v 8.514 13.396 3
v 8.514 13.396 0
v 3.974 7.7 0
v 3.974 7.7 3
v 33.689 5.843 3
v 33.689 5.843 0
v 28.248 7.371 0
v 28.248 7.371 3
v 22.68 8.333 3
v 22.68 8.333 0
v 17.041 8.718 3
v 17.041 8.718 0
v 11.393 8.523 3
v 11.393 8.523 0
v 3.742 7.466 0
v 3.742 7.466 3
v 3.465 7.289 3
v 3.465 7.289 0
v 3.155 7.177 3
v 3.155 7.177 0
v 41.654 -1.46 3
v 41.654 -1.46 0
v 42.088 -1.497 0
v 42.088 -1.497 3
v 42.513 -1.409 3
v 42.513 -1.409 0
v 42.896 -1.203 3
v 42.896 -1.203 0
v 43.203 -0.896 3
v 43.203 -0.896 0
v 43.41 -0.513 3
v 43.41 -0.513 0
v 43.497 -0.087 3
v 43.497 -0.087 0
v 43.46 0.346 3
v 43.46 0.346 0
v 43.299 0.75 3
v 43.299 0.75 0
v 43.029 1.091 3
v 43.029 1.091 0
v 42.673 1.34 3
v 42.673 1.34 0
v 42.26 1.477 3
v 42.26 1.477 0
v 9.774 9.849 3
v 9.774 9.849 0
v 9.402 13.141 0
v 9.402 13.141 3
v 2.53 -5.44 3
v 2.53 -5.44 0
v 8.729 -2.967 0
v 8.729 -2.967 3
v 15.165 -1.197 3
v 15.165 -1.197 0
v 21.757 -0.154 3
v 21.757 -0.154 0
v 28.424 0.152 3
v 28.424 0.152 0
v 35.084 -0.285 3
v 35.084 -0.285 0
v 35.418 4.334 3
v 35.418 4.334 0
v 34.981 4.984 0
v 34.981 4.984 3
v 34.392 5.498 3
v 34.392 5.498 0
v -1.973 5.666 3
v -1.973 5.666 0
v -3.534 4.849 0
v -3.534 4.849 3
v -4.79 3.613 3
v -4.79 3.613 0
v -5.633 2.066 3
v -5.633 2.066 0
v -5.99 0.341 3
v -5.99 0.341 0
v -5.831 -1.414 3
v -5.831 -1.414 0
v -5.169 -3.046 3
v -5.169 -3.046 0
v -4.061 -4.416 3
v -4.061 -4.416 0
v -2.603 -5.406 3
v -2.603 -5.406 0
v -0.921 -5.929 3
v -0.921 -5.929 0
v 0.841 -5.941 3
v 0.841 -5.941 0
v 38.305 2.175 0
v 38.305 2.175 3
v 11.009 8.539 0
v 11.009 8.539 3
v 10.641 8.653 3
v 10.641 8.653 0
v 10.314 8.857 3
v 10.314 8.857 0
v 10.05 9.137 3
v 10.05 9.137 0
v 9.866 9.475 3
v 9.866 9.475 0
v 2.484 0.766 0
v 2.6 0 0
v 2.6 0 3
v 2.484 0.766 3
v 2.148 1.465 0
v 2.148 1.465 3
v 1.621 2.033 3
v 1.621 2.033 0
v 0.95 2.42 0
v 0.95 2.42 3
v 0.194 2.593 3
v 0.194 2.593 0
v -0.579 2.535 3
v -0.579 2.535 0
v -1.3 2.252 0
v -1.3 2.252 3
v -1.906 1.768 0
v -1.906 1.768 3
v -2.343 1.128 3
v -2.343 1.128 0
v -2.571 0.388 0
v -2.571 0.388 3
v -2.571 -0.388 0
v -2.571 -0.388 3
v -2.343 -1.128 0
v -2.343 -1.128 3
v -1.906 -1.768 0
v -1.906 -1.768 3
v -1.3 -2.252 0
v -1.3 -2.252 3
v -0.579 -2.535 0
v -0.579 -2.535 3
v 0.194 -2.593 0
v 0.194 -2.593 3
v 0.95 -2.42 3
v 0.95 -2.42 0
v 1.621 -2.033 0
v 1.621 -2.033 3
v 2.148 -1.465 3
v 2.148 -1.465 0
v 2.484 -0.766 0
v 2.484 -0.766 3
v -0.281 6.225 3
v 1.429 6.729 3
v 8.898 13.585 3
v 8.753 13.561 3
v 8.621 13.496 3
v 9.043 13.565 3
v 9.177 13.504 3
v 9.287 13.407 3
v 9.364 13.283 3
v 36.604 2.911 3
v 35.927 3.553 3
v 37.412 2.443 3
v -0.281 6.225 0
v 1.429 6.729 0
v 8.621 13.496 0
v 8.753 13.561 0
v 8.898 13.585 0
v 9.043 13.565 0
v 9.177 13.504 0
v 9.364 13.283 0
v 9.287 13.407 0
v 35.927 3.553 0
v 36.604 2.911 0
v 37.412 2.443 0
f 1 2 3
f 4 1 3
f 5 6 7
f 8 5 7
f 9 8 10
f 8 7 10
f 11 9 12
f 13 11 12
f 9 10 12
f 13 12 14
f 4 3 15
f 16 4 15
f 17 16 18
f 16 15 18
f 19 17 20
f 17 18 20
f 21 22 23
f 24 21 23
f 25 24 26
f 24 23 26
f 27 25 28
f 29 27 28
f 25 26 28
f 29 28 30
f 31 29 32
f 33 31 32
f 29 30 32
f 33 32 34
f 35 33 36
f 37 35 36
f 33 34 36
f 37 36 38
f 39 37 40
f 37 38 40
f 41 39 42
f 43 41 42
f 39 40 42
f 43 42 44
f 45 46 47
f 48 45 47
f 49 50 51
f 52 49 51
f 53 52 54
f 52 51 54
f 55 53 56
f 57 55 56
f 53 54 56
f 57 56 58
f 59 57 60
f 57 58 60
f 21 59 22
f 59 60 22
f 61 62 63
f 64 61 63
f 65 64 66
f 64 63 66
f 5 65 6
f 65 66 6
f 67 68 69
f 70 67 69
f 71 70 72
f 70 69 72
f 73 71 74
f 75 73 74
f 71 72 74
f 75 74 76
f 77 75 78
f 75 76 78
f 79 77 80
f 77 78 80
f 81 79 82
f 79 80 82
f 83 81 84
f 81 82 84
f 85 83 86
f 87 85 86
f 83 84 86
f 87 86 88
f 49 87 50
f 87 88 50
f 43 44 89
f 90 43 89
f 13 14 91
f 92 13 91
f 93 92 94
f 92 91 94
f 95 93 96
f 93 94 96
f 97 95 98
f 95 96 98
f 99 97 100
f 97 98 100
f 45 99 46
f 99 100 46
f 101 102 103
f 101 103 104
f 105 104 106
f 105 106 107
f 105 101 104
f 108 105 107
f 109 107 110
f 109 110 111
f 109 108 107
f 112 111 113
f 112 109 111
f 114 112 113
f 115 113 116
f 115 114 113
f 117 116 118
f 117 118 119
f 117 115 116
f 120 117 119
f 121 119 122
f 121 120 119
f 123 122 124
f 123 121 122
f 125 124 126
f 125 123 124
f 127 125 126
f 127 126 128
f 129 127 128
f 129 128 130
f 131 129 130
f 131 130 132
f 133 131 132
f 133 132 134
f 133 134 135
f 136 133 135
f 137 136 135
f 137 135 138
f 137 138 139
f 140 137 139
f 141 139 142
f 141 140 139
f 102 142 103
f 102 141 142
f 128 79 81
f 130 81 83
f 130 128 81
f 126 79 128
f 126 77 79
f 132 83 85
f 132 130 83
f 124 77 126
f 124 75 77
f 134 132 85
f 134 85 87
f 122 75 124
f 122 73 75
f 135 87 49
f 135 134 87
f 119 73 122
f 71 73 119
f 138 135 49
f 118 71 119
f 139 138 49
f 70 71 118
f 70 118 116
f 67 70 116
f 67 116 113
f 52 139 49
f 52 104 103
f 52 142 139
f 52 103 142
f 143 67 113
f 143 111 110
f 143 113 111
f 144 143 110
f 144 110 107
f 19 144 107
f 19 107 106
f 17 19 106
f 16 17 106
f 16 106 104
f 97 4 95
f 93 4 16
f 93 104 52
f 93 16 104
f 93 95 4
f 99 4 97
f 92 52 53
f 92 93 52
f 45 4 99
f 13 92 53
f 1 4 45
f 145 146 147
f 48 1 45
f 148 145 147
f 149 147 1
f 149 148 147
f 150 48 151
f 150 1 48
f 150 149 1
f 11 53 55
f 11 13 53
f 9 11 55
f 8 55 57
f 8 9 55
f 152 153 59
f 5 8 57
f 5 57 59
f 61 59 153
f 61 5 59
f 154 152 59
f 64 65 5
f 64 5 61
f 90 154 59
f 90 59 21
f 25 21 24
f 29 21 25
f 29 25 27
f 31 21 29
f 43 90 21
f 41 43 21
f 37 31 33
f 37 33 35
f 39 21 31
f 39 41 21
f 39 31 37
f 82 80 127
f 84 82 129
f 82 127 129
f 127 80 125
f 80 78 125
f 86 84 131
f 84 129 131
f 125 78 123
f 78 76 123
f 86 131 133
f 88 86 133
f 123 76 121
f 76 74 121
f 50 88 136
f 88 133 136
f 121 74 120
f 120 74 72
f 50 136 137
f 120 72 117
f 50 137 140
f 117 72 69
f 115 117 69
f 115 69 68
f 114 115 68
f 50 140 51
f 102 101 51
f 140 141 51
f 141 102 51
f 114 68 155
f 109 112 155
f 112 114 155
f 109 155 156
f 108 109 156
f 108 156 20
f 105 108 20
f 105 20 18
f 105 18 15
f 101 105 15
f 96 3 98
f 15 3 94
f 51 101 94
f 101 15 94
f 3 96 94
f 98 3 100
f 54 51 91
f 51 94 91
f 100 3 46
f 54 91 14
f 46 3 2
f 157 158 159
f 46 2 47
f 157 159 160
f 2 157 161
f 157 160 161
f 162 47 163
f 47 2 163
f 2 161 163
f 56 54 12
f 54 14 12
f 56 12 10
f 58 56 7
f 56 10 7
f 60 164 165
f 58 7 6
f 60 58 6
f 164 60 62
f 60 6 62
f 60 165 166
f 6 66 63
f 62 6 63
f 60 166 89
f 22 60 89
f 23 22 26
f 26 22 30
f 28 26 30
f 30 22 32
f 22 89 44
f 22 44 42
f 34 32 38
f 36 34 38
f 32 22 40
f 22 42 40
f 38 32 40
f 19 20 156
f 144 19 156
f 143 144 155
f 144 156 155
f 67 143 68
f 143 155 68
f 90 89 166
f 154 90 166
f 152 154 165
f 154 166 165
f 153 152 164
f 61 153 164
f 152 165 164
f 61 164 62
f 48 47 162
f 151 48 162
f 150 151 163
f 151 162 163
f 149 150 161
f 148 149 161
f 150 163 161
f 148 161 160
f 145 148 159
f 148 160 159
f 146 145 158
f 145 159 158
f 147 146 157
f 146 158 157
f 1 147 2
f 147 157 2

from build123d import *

# Parameters (mm, degrees)
ESQUISSE1_R          = 2.6
BASE_EXTRUSION_DEPTH = 3


with BuildPart() as part:
    # Esquisse1 → Base-Extrusion (new body)
    with BuildSketch(Plane.XY):
        with BuildLine():
            Line((42.260472267, 1.47721163), (38.305407289, 2.174596295))
            ThreePointArc((38.305407289, 2.174596295), (36.604258385, 2.910637942), (35.417544816, 4.334497417))
            ThreePointArc((35.417544816, 4.334497417), (34.703252614, 5.26032071), (33.689272741, 5.842735456))
            ThreePointArc((33.689272741, 5.842735456), (22.679517475, 8.332820348), (11.393281032, 8.522822221))
            ThreePointArc((11.393281032, 8.522822221), (10.314139297, 8.856754257), (9.773978095, 9.848864818))
            Line((9.773978095, 9.848864818), (9.402019506, 13.140725264))
            ThreePointArc((9.402019506, 13.140725264), (9.043446847, 13.565088236), (8.514166767, 13.396206973))
            Line((8.514166767, 13.396206973), (3.974497387, 7.699944601))
            ThreePointArc((3.974497387, 7.699944601), (3.608247601, 7.370259002), (3.154924555, 7.177050008))
            ThreePointArc((3.154924555, 7.177050008), (0.572430777, 6.483979152), (-1.973326778, 5.666214029))
            ThreePointArc((-1.973326778, 5.666214029), (-5.560323829, -2.254506357), (2.530032468, -5.440490393))
            ThreePointArc((2.530032468, -5.440490393), (21.756803647, -0.153586273), (41.654398955, -1.459643764))
            ThreePointArc((41.654398955, -1.459643764), (43.469044461, -0.303163936), (42.260472267, 1.47721163))
        make_face()
        Circle(ESQUISSE1_R, mode=Mode.SUBTRACT)
    extrude(amount=BASE_EXTRUSION_DEPTH)


solid = part.part
